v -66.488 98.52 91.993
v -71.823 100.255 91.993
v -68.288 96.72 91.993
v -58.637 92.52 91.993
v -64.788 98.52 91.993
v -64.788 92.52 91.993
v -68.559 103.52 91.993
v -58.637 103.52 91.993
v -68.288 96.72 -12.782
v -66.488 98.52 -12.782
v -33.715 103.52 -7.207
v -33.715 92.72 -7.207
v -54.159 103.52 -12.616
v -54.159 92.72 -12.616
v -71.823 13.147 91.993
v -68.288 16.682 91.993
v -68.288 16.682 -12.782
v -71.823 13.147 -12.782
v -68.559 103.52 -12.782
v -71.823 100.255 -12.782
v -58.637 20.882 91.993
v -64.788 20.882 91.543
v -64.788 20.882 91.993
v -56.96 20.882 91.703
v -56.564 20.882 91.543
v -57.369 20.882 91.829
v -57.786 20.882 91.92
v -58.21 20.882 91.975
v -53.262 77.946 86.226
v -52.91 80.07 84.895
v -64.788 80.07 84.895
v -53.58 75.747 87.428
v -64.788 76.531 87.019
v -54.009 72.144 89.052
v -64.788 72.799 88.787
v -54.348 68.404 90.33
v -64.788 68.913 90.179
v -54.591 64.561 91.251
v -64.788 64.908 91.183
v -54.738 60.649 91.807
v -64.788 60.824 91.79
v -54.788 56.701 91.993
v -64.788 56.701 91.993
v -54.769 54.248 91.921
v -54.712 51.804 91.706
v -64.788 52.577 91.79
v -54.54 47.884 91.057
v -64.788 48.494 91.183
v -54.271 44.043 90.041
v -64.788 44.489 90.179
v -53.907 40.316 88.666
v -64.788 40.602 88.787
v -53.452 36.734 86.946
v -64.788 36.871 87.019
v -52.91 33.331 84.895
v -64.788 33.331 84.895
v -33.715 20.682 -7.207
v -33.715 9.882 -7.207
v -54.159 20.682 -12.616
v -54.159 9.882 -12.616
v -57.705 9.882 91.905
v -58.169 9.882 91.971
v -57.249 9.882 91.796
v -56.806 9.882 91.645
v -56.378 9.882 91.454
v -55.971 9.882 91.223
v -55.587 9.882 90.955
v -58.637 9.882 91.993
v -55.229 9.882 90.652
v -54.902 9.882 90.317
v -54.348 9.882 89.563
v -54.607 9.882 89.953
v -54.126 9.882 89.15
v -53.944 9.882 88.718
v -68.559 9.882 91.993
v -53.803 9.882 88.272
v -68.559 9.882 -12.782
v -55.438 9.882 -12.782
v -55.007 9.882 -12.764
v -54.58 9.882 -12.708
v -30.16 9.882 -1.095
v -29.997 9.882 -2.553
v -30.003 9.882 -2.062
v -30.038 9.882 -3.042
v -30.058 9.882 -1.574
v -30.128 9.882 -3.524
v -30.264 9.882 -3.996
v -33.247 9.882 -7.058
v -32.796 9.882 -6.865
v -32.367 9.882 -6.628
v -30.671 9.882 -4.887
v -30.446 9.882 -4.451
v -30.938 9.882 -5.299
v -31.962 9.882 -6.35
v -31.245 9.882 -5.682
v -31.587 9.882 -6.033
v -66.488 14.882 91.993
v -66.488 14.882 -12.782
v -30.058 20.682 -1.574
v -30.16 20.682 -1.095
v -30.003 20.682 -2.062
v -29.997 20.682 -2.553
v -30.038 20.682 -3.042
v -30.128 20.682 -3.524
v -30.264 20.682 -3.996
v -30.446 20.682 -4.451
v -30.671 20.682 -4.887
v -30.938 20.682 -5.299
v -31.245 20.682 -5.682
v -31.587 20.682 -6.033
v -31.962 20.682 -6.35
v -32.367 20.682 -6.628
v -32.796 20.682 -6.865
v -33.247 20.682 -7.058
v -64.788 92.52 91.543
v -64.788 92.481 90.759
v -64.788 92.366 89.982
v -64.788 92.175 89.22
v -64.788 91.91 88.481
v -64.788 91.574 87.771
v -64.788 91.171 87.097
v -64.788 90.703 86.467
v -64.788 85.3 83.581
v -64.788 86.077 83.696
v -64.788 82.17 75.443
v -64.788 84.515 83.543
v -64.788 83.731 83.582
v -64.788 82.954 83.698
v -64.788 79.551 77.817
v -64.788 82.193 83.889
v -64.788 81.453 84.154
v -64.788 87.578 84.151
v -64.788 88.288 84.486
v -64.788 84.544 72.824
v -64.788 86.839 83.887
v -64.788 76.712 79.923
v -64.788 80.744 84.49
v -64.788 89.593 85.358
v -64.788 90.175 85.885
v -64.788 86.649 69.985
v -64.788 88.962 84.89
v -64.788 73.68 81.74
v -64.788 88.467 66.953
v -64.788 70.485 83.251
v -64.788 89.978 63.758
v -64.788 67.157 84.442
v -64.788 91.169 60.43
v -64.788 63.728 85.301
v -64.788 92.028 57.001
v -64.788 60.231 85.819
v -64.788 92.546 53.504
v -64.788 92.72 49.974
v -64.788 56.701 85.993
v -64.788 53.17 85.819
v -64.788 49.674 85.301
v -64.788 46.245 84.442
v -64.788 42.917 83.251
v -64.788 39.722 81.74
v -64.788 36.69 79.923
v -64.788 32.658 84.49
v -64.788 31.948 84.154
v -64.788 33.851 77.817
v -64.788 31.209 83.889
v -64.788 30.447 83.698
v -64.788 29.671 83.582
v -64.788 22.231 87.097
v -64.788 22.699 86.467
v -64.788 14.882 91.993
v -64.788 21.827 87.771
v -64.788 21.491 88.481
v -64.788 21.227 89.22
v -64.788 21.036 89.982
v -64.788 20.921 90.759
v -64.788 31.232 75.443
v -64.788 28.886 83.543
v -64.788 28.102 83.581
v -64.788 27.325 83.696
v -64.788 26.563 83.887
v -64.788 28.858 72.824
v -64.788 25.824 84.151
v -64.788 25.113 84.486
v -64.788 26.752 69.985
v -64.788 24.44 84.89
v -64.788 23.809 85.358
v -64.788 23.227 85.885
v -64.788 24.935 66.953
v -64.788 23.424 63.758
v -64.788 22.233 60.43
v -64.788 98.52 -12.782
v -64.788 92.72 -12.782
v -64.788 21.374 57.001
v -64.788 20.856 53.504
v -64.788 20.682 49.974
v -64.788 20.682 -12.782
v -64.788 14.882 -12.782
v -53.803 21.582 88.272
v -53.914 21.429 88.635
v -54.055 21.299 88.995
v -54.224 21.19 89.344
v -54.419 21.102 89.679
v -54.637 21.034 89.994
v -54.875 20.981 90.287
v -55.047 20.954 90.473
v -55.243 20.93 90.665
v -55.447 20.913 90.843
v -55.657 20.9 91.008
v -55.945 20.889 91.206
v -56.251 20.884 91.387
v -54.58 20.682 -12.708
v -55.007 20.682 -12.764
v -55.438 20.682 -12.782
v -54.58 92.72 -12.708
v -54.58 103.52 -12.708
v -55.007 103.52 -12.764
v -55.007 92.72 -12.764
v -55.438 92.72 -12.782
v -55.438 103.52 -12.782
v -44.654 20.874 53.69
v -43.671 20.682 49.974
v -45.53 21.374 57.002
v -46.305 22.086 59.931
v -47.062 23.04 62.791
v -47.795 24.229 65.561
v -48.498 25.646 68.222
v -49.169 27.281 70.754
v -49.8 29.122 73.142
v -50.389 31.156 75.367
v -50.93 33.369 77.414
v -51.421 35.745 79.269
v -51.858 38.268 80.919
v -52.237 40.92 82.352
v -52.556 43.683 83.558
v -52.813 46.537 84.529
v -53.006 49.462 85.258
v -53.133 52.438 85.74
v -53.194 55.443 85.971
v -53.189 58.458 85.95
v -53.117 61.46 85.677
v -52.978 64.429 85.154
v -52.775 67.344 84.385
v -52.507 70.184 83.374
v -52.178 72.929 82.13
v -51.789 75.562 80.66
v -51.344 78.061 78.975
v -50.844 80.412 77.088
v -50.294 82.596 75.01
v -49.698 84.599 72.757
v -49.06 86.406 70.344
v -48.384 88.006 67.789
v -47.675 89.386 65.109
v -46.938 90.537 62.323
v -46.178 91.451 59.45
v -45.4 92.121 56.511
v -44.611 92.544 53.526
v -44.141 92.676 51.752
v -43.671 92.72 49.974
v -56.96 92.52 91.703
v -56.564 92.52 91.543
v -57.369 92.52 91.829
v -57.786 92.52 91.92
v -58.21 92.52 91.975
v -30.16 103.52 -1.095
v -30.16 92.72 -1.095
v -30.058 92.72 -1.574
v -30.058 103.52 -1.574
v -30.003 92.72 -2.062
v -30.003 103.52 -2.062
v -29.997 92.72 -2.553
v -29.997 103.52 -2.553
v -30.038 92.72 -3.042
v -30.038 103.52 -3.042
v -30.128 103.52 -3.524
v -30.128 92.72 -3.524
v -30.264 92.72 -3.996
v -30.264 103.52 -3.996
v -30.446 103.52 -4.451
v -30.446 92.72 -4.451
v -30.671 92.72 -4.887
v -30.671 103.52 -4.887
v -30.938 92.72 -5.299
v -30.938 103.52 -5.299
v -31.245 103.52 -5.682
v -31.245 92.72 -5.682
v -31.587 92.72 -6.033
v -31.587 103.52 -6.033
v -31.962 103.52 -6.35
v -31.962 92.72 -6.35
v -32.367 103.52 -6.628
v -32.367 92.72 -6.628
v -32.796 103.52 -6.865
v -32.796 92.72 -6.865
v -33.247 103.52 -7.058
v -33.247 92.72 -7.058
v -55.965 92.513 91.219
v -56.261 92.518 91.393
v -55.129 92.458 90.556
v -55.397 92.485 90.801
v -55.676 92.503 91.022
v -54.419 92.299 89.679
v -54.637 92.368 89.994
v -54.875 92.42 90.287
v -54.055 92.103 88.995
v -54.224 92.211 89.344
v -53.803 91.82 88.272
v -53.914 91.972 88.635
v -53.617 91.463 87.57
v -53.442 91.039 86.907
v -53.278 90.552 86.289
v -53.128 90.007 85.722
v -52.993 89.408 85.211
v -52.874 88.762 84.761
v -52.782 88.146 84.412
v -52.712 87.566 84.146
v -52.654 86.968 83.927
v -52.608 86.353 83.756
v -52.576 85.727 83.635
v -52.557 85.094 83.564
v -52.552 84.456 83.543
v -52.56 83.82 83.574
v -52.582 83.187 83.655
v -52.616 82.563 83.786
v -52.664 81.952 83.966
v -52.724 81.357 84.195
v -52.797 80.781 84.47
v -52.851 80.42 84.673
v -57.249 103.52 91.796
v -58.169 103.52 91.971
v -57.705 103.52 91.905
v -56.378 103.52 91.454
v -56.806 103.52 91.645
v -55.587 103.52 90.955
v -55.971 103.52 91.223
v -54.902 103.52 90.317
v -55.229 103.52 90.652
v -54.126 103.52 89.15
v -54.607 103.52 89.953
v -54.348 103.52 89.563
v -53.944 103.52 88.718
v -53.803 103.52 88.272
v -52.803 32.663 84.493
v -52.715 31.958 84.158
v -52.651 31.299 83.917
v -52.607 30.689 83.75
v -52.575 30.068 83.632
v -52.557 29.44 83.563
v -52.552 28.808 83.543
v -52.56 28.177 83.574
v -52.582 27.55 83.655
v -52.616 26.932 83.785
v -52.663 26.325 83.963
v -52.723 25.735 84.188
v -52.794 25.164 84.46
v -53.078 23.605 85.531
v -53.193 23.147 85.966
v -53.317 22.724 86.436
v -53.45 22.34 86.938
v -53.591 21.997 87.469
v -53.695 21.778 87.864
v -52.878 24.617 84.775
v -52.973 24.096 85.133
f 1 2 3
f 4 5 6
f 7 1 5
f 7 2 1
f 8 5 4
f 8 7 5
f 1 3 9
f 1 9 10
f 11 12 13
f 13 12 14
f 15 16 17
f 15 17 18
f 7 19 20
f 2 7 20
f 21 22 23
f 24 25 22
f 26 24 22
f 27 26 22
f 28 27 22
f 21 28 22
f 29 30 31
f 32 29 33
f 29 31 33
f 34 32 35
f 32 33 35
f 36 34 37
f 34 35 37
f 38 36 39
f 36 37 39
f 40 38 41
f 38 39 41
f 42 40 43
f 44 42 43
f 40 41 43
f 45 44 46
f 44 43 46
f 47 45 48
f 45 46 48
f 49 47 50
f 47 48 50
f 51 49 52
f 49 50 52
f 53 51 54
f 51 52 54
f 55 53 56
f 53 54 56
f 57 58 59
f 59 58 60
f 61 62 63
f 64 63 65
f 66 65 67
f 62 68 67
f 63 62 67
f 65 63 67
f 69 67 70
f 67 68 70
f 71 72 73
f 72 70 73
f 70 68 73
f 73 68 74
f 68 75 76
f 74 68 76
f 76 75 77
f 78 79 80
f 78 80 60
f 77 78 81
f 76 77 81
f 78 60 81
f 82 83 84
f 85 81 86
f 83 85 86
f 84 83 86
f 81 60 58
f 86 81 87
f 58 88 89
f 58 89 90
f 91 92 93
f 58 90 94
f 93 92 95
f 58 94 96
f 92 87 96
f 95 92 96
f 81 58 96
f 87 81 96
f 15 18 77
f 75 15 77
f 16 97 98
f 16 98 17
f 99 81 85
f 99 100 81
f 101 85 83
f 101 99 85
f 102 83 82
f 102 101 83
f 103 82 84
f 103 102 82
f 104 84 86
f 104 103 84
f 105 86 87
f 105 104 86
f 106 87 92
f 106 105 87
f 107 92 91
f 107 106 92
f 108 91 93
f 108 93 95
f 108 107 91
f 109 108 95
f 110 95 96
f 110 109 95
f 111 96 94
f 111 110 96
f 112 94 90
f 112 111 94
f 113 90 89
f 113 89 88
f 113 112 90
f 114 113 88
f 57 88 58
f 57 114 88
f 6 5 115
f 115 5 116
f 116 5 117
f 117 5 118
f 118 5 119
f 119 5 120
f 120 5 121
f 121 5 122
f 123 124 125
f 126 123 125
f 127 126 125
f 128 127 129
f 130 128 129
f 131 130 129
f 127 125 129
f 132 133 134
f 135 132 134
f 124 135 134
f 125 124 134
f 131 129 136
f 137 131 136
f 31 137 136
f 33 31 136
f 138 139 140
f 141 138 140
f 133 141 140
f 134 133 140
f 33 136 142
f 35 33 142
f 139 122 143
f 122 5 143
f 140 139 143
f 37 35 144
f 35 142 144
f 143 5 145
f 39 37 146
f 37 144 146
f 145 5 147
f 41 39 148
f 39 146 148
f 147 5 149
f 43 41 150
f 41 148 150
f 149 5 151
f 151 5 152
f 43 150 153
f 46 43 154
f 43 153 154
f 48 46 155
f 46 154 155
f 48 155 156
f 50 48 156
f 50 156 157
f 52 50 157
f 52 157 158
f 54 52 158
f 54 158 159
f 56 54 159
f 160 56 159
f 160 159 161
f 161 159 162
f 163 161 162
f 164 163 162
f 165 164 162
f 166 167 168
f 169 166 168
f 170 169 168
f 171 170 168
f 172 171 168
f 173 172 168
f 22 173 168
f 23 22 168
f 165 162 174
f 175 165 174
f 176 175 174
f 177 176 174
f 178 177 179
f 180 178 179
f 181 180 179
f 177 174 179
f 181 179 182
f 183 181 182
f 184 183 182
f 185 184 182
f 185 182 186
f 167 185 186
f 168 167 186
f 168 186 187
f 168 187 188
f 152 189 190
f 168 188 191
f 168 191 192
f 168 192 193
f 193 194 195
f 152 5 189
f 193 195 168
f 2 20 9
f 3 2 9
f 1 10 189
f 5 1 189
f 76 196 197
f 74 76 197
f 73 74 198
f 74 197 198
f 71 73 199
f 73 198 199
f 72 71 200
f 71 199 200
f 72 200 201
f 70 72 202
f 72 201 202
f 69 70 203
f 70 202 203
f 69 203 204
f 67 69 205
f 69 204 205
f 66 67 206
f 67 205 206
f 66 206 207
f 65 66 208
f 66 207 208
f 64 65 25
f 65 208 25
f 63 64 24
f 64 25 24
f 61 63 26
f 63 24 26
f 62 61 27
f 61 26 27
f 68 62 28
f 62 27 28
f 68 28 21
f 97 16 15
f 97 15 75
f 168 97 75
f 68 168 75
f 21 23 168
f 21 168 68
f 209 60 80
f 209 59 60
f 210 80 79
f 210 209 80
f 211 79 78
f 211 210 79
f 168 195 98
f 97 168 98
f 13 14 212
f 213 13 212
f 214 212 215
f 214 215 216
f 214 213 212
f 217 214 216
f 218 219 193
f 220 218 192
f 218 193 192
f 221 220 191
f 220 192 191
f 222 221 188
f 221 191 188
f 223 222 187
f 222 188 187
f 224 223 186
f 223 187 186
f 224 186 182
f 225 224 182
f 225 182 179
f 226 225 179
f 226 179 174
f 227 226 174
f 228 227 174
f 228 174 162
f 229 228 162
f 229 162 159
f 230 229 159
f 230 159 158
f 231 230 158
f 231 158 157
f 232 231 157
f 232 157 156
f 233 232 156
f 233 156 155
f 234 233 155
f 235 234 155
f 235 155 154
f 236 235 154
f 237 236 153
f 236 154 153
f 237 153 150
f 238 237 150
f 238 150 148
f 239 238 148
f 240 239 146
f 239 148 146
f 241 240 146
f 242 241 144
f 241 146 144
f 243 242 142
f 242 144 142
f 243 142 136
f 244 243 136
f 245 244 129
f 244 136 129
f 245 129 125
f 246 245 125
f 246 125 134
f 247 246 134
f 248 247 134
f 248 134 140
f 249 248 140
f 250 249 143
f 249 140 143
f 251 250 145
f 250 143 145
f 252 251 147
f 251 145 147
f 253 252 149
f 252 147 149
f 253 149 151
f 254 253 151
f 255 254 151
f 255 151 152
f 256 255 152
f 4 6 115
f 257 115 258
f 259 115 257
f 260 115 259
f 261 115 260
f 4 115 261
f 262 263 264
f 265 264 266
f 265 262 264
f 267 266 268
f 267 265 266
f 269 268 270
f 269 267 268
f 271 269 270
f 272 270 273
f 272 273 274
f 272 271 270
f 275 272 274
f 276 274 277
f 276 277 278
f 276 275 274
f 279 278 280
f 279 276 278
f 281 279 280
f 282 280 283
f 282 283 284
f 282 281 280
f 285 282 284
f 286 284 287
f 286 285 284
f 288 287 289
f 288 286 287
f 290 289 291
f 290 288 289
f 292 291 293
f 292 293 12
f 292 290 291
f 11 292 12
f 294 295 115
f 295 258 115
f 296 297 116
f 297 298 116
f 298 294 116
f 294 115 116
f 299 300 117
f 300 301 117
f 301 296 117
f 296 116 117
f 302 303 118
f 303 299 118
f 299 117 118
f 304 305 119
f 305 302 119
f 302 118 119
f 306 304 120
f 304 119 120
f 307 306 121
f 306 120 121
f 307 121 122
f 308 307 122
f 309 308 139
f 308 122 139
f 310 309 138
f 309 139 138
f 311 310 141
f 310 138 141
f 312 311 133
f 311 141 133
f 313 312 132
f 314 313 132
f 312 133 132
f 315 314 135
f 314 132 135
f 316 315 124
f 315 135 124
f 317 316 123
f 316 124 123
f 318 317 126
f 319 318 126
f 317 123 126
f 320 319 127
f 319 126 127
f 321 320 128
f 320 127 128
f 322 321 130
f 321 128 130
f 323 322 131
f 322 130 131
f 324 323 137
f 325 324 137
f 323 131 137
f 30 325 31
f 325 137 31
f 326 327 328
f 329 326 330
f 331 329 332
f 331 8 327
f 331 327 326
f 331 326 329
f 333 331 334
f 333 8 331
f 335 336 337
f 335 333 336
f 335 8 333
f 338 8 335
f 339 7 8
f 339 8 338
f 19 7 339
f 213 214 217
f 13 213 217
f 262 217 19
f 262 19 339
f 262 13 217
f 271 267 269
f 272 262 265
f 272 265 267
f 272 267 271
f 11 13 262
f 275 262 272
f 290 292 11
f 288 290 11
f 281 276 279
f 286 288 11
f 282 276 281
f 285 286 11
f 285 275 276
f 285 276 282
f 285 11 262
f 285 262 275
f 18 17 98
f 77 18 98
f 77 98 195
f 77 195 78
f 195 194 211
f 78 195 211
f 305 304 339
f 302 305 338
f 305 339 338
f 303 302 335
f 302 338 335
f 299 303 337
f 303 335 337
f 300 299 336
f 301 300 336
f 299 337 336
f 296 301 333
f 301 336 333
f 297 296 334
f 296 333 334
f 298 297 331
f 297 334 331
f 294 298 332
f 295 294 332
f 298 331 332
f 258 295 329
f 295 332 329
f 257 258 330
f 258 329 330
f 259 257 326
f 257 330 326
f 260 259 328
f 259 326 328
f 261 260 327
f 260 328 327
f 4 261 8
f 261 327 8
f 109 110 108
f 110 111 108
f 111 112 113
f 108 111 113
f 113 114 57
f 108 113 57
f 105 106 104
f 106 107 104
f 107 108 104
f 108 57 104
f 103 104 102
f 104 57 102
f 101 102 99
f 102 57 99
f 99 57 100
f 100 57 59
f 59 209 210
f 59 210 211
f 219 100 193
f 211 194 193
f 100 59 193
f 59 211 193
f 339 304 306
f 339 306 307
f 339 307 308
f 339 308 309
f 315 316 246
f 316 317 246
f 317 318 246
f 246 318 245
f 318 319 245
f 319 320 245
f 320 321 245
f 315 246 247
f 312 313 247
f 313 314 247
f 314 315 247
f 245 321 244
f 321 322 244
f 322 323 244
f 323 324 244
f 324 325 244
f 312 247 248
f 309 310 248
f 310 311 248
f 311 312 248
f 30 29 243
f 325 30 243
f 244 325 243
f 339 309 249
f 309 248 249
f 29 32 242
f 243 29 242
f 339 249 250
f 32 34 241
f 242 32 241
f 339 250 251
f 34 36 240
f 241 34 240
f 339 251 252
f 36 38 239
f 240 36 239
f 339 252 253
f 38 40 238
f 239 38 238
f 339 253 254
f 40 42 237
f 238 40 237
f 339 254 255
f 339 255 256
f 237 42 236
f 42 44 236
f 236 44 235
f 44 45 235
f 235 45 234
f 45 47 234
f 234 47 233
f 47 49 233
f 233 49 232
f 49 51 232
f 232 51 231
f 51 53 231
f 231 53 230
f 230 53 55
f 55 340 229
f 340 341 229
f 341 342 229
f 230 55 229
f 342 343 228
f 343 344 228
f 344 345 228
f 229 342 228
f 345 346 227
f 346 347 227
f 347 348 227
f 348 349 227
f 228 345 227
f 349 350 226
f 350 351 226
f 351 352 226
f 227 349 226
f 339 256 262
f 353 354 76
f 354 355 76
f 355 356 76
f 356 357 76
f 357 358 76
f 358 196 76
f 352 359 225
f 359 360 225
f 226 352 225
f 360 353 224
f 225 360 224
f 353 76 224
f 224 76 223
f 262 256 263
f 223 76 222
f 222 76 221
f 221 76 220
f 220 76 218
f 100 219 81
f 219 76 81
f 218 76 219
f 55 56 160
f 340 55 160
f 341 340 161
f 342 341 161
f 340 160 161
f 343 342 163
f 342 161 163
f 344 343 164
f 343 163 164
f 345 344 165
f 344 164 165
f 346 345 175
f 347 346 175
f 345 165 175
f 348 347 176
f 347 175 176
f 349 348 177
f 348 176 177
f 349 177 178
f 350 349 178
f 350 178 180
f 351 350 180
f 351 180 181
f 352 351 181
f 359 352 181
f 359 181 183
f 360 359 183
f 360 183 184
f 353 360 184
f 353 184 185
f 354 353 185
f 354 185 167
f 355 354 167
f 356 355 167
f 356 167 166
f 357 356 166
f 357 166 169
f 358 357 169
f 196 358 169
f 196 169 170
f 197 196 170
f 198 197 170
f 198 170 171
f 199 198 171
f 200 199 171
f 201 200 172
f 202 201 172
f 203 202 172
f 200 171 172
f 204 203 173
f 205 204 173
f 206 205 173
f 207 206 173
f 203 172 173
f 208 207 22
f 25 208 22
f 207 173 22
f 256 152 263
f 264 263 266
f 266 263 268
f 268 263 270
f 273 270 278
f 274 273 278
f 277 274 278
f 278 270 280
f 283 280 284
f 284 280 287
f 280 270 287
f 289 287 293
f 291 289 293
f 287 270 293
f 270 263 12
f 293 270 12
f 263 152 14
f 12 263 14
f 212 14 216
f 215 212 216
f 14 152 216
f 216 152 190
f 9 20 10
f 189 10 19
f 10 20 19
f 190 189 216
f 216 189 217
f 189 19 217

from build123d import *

# Parameters (mm, degrees)
BOSS_EXTRUDE1_DEPTH      = 91.992761
BOSS_EXTRUDE1_DEPTH_BACK = 12.782239
BOSS_EXTRUDE2_DEPTH      = 93.6375
CUT_EXTRUDE1_DEPTH       = 144.067335103
FILLET1_R                = 5


with BuildPart() as part:
    # Sketch1 → Boss-Extrude1 (new, two sides: drawn at the far end of the back side and taken through both)
    with BuildSketch(Plane.XY.offset(-BOSS_EXTRUDE1_DEPTH_BACK)):
        Polygon((-68.287510941, 96.719618957), (-66.487510941, 98.519618957), (-64.787510941, 98.519618957), (-64.787510941, 14.882118957), (-66.487510941, 14.882118957), (-68.287510941, 16.682118957), (-71.823044847, 13.146585051), (-68.558578753, 9.882118957), (-54.787510941, 9.882118957), (-54.787510941, 103.519618957), (-68.558578753, 103.519618957), (-71.823044847, 100.255152863), align=None)
    extrude(amount=BOSS_EXTRUDE1_DEPTH + BOSS_EXTRUDE1_DEPTH_BACK)

    # Sketch2 → Boss-Extrude2 (add)
    with BuildSketch(Plane(origin=(0, 9.882118957, 0), x_dir=(1, 0, 0), z_dir=(0, 1, 0))):
        Polygon((-54.787510941, 12.782239353), (-54.787510941, -91.992760647), (-28.880926753, 5.928233091), align=None)
    extrude(amount=BOSS_EXTRUDE2_DEPTH)

    # Sketch3 → Cut-Extrude1 (cut, through all)
    with BuildSketch(Plane.ZY.offset(64.787510941)):
        with BuildLine():
            Line((49.974010647, 92.719618957), (-12.782239353, 92.719618957))
            Line((-12.782239353, 92.719618957), (-12.782239353, 20.682118957))
            Line((-12.782239353, 20.682118957), (49.974010647, 20.682118957))
            ThreePointArc((49.974010647, 20.682118957), (85.992760647, 56.700868957), (49.974010647, 92.719618957))
        make_face()
        with BuildLine():
            Line((91.543139818, 20.882118957), (97.180187327, 20.882118957))
            Line((97.180187327, 20.882118957), (97.180187327, 92.519618957))
            Line((97.180187327, 92.519618957), (91.543139818, 92.519618957))
            ThreePointArc((91.543139818, 92.519618957), (84.486417774, 88.288262479), (84.894572363, 80.070287456))
            ThreePointArc((84.894572363, 80.070287456), (91.992760647, 56.700868957), (84.894572363, 33.331450457))
            ThreePointArc((84.894572363, 33.331450457), (84.486417774, 25.113475435), (91.543139818, 20.882118957))
        make_face()
    extrude(amount=-CUT_EXTRUDE1_DEPTH, mode=Mode.SUBTRACT)

    # Fillet1
    fillet1_edges = [part.edges().sort_by_distance(p)[0] for p in [
        (-54.787510941, 15.282118957, -12.782239),
        (-54.787510941, 98.119618957, -12.782239),
        (-28.880926753, 15.282118957, -5.928233091),
        (-28.880926753, 98.119618957, -5.928233091),
        (-54.787510941, 15.382118957, 91.992761),
        (-54.787510941, 98.019618957, 91.992761),
    ]]
    fillet(fillet1_edges, radius=FILLET1_R)


solid = part.part
